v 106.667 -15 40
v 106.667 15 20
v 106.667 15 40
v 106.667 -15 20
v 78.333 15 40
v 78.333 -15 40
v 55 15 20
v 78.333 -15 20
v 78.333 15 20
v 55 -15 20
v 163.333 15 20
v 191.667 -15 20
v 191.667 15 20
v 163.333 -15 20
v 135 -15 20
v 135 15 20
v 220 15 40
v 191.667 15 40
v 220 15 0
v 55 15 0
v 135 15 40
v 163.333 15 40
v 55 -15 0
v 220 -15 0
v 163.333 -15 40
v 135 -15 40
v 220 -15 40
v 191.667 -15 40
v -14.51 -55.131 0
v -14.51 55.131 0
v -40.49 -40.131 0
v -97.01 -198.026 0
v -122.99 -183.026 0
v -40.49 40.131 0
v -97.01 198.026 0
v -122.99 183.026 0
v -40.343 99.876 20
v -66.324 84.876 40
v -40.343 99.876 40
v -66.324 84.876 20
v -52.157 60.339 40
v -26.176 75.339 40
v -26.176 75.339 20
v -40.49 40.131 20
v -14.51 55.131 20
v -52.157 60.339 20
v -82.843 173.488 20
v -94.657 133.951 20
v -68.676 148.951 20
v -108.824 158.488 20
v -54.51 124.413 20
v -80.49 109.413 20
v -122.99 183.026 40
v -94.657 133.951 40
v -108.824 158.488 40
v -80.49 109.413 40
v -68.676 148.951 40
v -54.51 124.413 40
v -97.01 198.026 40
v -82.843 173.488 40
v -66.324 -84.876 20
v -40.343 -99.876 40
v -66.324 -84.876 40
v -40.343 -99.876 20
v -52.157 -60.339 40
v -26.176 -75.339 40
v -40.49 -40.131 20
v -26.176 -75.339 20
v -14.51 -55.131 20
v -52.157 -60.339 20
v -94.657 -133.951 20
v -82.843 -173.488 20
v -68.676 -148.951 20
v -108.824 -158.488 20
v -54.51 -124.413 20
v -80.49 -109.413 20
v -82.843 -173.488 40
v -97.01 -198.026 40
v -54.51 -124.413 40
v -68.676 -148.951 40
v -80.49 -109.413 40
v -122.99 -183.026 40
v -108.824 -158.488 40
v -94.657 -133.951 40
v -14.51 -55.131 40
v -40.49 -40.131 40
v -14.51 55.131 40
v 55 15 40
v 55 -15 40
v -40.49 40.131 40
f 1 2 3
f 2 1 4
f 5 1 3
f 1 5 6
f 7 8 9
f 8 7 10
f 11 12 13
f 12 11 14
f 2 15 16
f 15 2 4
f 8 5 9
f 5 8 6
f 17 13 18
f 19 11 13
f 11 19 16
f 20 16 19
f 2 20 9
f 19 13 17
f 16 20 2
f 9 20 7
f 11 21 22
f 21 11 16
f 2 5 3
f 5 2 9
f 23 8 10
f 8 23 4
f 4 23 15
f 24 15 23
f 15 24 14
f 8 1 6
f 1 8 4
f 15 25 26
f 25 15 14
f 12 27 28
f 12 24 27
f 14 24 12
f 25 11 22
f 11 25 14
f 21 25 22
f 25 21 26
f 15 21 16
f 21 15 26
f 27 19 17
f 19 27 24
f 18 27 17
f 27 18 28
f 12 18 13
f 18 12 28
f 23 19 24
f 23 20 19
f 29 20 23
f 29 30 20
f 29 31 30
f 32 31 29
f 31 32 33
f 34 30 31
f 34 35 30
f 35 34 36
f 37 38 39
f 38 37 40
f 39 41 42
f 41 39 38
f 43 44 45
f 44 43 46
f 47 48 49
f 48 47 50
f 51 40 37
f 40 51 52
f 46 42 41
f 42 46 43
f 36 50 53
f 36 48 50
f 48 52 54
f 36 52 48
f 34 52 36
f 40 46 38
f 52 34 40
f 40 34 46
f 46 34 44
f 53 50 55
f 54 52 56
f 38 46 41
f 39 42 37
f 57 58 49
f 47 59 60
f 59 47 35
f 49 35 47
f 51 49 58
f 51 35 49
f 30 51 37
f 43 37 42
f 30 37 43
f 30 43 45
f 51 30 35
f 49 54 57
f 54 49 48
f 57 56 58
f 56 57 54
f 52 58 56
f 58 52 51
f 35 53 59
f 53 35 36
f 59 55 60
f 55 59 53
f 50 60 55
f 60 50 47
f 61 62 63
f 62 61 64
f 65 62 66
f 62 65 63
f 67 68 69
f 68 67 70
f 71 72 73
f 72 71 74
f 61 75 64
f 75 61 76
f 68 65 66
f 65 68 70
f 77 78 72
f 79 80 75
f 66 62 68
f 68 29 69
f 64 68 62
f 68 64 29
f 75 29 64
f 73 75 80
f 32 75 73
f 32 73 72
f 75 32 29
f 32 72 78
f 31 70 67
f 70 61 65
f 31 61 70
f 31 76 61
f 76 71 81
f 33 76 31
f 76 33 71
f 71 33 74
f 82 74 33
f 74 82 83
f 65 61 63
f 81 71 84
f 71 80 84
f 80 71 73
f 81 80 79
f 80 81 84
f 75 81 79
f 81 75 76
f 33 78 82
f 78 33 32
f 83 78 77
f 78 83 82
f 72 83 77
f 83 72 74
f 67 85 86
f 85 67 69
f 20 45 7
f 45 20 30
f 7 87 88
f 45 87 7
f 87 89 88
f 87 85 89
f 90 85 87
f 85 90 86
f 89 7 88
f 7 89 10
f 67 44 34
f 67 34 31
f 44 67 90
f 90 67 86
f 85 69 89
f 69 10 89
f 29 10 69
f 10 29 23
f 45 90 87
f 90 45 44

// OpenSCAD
body_radius=50;
height=40;
finger_length=170;
finger_width=30;
num_fingers=3;
num_teeth_per_finger=3;

starfish(body_radius, height, finger_length, finger_width, num_fingers, num_teeth_per_finger, show_holes=false);

module starfish(body_radius, height, finger_length, finger_width, num_fingers, num_teeth_per_finger, echo_holes=true, show_holes=false, eps=0.5)
{
    translate([0, 0, height/2])
        body(radius=body_radius, width=finger_width, height=height, num_ports=num_fingers);
    angle = 360/num_fingers;
    for (i=[0:num_fingers-1])
    {
        rotate(a=i*angle, v=[0,0,1])
            translate([body_radius, -finger_width/2, 0])
                finger(length=finger_length, width=finger_width, height=height, num_teeth=num_teeth_per_finger);
        holes(body_radius, height, finger_length, finger_width, num_fingers, num_teeth_per_finger, i*angle, echo_holes, show_holes, eps);
    }
}


module holes(body_radius, height, finger_length, finger_width, num_fingers, num_teeth_per_finger, angle, echo_holes, show_holes, eps)
{
    if (echo_holes || show_holes)
    {
        teeth_length = finger_length / (2*num_teeth_per_finger);
        hole_0 = rotate_point(point=[body_radius-eps, 0, 0.9*height], angle=angle);
        if (echo_holes) {echo(hole_0);}
        if (show_holes) {translate(hole_0)sphere(d=5);}
        for (j=[1:2:2*num_teeth_per_finger])
        {
            center = [(j+0.5)*teeth_length+body_radius, 0, 0.9*height];
            shift = [0.5*teeth_length-eps,0,0];
            hole_1 = rotate_point(point=center-shift, angle=angle);
            hole_2 = rotate_point(point=center+shift, angle=angle);
            if (echo_holes) {echo(hole_1); echo(hole_2);}
            if (show_holes) {translate(hole_1)sphere(d=5); translate(hole_2)sphere(d=5);}
        }           
    }
}


module body(radius, width, height, num_ports)
{
    angle = 360/num_ports;
    hull()
    {
        for (i=[0:num_ports-1])
        {
            rotate(a=i*angle, v=[0,0,1])
                translate([radius, 0, 0]) cube([10, width, height], center=true);
        }
     }
    
}


module finger(length, width, height, num_teeth)
{
    teeth_length = length / (num_teeth*2);
    cube([length, width, height/2]);
    for (i=[1:2:2*num_teeth])
    {
        translate([i*teeth_length, 0, height/2])
            cube([teeth_length, width, height/2]);
    }
   
}


function rotate_point(point, angle) =
    [
        [cos(angle), -sin(angle), 0],
        [sin(angle),  cos(angle), 0],
        [         0,           0, 1]
   ] * point;
